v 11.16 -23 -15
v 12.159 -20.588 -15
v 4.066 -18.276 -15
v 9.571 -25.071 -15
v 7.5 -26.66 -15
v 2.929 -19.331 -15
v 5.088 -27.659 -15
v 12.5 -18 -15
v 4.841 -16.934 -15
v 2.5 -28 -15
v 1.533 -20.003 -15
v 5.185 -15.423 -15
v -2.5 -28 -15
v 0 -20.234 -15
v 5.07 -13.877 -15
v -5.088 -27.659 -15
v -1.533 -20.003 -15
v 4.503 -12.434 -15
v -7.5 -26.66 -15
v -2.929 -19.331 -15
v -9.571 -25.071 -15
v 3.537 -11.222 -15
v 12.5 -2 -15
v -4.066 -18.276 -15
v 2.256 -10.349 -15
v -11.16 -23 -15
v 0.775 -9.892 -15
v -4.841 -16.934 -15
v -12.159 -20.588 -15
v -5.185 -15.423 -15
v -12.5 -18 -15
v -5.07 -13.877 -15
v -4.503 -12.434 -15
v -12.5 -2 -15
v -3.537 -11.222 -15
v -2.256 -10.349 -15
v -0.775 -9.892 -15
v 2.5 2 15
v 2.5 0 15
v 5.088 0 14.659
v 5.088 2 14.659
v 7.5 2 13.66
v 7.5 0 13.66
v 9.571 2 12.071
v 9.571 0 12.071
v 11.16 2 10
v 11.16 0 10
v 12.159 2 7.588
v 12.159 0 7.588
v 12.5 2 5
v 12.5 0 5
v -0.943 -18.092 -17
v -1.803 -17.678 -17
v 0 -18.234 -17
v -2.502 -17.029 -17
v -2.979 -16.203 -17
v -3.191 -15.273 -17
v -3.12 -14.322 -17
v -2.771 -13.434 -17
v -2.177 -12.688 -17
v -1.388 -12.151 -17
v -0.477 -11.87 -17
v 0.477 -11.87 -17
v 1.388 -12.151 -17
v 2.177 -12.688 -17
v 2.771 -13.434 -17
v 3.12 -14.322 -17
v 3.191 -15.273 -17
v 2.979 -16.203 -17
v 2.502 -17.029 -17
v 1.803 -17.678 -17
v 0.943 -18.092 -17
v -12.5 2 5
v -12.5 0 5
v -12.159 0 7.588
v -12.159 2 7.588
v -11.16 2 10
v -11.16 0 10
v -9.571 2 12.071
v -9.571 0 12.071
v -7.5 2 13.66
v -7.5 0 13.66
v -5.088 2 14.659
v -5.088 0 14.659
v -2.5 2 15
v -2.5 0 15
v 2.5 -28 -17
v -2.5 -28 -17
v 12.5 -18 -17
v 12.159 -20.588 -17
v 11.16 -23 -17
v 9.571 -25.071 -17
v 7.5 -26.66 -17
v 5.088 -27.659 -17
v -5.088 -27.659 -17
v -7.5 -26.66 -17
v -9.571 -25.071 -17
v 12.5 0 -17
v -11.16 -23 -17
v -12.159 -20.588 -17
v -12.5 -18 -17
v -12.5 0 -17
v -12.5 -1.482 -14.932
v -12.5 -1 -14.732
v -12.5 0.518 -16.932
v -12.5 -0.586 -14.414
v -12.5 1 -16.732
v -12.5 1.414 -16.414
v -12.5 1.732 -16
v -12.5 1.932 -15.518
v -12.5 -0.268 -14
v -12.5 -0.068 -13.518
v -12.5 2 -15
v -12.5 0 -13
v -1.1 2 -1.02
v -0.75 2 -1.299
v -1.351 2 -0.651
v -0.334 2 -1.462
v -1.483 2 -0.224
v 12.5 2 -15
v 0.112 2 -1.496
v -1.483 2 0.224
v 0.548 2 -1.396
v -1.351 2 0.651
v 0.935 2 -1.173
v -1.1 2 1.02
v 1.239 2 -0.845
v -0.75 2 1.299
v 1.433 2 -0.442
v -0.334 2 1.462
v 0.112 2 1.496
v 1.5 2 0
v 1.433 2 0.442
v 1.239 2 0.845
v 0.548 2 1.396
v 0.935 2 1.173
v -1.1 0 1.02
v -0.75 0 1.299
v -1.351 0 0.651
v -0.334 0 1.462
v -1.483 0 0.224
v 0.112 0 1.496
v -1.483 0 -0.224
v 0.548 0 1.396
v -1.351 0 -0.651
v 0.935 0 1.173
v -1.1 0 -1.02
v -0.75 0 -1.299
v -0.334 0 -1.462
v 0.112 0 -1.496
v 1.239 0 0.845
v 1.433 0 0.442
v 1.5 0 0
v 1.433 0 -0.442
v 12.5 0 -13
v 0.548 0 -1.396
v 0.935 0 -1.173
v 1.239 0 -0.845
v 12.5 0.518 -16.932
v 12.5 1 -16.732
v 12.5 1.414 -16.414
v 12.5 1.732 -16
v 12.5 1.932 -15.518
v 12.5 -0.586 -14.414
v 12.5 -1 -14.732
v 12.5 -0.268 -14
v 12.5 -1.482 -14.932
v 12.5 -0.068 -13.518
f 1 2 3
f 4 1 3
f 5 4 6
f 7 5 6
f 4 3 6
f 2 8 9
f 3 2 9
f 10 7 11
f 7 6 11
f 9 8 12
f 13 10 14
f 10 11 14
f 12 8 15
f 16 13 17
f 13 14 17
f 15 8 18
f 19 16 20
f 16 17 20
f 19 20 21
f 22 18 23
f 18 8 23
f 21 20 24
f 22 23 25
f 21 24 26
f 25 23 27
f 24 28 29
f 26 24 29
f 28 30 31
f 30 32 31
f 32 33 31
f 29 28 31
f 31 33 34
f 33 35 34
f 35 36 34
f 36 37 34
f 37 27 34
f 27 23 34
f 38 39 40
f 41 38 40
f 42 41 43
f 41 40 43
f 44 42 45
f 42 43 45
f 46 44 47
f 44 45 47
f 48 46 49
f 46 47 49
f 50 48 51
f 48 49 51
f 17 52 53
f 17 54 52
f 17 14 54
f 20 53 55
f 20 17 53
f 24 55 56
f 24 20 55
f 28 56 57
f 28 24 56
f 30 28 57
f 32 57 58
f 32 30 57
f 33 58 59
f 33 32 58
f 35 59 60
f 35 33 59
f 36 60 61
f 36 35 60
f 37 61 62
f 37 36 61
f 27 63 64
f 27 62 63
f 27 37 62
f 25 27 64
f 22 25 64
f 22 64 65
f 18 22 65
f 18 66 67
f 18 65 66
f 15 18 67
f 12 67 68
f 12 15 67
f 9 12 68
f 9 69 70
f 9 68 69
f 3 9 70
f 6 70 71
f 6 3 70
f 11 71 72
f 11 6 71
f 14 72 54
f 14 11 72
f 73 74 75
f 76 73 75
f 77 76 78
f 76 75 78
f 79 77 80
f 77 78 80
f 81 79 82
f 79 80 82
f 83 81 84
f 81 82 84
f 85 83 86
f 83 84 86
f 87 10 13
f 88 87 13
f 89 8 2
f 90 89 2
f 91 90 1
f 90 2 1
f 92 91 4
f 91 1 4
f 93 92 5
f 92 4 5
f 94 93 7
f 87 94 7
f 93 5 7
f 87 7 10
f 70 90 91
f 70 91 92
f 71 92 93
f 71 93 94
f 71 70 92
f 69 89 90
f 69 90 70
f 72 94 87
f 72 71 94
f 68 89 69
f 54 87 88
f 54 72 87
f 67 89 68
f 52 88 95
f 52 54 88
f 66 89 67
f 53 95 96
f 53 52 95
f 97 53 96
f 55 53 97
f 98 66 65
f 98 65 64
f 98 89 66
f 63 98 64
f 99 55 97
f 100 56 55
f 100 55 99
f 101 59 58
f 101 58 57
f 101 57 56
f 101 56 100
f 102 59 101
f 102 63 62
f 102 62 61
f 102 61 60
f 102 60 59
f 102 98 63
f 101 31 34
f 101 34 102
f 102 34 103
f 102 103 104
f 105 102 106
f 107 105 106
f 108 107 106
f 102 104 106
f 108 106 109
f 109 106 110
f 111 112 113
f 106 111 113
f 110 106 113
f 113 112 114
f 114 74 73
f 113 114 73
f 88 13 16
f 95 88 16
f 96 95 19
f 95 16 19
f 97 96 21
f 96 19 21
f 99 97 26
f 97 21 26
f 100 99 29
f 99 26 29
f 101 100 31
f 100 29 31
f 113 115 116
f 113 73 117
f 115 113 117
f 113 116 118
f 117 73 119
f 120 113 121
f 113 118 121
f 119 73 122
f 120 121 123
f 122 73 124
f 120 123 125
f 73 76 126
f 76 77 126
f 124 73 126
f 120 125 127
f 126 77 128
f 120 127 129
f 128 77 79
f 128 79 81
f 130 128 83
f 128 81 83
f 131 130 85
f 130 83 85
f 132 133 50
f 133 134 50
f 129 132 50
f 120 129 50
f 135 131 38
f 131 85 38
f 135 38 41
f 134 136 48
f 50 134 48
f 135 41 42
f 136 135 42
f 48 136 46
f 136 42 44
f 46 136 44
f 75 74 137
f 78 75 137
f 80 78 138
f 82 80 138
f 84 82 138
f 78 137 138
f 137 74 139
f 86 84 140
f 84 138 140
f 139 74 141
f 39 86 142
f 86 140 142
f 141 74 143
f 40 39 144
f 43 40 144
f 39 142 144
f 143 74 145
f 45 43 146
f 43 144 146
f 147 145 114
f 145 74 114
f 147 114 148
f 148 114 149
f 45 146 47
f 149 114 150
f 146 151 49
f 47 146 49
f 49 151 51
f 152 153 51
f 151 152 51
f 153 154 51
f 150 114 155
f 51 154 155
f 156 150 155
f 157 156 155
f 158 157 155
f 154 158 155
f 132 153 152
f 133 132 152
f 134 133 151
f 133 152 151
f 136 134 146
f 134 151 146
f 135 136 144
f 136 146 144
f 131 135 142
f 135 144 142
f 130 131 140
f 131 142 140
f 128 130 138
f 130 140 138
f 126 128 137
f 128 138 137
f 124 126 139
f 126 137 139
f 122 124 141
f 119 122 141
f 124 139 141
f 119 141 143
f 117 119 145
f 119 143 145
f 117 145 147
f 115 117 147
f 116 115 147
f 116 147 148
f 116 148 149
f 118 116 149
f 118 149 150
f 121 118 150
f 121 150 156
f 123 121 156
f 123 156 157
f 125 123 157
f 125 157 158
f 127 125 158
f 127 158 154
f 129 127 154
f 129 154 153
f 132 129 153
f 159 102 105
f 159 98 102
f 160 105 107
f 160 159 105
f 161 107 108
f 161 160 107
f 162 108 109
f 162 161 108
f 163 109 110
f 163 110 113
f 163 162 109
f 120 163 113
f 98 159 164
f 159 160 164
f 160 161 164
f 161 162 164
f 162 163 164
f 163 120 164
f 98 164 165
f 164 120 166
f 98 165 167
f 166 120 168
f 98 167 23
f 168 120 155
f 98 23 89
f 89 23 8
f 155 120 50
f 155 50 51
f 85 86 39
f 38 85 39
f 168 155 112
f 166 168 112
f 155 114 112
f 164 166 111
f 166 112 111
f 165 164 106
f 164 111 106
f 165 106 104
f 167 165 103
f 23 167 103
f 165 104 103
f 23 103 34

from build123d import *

# Parameters (mm, degrees)
EXTRUDE_1_DEPTH     = 2
EXTRUDE_2_DEPTH     = 2
FILLET_1_R          = 2
FILLET_2_R          = 2
SKETCH_8_R          = 1.5
CUT_EXTRUDE_1_DEPTH = 10


with BuildPart() as part:
    # Эскиз1 → Бобышка-Вытянуть1 (new body)
    with BuildSketch(Plane(origin=(0, 0, 0), x_dir=(1, 0, 0), z_dir=(0, 1, 0))):
        with BuildLine():
            Line((-2.5, -15), (2.5, -15))
            ThreePointArc((2.5, -15), (9.571067812, -12.071067812), (12.5, -5))
            Line((12.5, -5), (12.5, 15))
            Line((12.5, 15), (-12.5, 15))
            Line((-12.5, 15), (-12.5, -5))
            ThreePointArc((-12.5, -5), (-9.571067812, -12.071067812), (-2.5, -15))
        make_face()
    extrude(amount=EXTRUDE_1_DEPTH)

    # Эскиз3 → Бобышка-Вытянуть2 (add)
    with BuildSketch(Plane(origin=(0, 0, -15), x_dir=(-1, 0, 0), z_dir=(0, 0, -1))):
        with BuildLine():
            Line((-2.5, -28), (2.5, -28))
            ThreePointArc((2.5, -28), (9.571067812, -25.071067812), (12.5, -18))
            Line((12.5, -18), (12.5, 2))
            Line((12.5, 2), (-12.5, 2))
            Line((-12.5, 2), (-12.5, -18))
            ThreePointArc((-12.5, -18), (-9.571067812, -25.071067812), (-2.5, -28))
        make_face()
    extrude(amount=EXTRUDE_2_DEPTH)

    # Скругление1
    fillet_1_edges = [part.edges().sort_by_distance(p)[0] for p in [
        (0, 0, -15),
    ]]
    fillet(fillet_1_edges, radius=FILLET_1_R)

    # Скругление2
    fillet_2_edges = [part.edges().sort_by_distance(p)[0] for p in [
        (0, 2, -17),
    ]]
    fillet(fillet_2_edges, radius=FILLET_2_R)

    # Эскиз7 → Зенковка для винта с полупотайной головкой M52 (revolve, cut)
    with BuildSketch(Plane(origin=(0, -15.034247801, -15), x_dir=(0, -1, 0), z_dir=(1, 0, 0))):
        Polygon((0, 0), (0, 2), (2.75, 2), (2.75, 2.45), (5.2, 0), align=None)
    revolve(axis=Axis((0, -15.034247801, -8.65), (0, 0, -1)), mode=Mode.SUBTRACT)

    # Эскиз8 → Вырез-Вытянуть1 (cut)
    with BuildSketch(Plane.XZ):
        Circle(SKETCH_8_R)
    extrude(amount=-CUT_EXTRUDE_1_DEPTH, mode=Mode.SUBTRACT)


solid = part.part
